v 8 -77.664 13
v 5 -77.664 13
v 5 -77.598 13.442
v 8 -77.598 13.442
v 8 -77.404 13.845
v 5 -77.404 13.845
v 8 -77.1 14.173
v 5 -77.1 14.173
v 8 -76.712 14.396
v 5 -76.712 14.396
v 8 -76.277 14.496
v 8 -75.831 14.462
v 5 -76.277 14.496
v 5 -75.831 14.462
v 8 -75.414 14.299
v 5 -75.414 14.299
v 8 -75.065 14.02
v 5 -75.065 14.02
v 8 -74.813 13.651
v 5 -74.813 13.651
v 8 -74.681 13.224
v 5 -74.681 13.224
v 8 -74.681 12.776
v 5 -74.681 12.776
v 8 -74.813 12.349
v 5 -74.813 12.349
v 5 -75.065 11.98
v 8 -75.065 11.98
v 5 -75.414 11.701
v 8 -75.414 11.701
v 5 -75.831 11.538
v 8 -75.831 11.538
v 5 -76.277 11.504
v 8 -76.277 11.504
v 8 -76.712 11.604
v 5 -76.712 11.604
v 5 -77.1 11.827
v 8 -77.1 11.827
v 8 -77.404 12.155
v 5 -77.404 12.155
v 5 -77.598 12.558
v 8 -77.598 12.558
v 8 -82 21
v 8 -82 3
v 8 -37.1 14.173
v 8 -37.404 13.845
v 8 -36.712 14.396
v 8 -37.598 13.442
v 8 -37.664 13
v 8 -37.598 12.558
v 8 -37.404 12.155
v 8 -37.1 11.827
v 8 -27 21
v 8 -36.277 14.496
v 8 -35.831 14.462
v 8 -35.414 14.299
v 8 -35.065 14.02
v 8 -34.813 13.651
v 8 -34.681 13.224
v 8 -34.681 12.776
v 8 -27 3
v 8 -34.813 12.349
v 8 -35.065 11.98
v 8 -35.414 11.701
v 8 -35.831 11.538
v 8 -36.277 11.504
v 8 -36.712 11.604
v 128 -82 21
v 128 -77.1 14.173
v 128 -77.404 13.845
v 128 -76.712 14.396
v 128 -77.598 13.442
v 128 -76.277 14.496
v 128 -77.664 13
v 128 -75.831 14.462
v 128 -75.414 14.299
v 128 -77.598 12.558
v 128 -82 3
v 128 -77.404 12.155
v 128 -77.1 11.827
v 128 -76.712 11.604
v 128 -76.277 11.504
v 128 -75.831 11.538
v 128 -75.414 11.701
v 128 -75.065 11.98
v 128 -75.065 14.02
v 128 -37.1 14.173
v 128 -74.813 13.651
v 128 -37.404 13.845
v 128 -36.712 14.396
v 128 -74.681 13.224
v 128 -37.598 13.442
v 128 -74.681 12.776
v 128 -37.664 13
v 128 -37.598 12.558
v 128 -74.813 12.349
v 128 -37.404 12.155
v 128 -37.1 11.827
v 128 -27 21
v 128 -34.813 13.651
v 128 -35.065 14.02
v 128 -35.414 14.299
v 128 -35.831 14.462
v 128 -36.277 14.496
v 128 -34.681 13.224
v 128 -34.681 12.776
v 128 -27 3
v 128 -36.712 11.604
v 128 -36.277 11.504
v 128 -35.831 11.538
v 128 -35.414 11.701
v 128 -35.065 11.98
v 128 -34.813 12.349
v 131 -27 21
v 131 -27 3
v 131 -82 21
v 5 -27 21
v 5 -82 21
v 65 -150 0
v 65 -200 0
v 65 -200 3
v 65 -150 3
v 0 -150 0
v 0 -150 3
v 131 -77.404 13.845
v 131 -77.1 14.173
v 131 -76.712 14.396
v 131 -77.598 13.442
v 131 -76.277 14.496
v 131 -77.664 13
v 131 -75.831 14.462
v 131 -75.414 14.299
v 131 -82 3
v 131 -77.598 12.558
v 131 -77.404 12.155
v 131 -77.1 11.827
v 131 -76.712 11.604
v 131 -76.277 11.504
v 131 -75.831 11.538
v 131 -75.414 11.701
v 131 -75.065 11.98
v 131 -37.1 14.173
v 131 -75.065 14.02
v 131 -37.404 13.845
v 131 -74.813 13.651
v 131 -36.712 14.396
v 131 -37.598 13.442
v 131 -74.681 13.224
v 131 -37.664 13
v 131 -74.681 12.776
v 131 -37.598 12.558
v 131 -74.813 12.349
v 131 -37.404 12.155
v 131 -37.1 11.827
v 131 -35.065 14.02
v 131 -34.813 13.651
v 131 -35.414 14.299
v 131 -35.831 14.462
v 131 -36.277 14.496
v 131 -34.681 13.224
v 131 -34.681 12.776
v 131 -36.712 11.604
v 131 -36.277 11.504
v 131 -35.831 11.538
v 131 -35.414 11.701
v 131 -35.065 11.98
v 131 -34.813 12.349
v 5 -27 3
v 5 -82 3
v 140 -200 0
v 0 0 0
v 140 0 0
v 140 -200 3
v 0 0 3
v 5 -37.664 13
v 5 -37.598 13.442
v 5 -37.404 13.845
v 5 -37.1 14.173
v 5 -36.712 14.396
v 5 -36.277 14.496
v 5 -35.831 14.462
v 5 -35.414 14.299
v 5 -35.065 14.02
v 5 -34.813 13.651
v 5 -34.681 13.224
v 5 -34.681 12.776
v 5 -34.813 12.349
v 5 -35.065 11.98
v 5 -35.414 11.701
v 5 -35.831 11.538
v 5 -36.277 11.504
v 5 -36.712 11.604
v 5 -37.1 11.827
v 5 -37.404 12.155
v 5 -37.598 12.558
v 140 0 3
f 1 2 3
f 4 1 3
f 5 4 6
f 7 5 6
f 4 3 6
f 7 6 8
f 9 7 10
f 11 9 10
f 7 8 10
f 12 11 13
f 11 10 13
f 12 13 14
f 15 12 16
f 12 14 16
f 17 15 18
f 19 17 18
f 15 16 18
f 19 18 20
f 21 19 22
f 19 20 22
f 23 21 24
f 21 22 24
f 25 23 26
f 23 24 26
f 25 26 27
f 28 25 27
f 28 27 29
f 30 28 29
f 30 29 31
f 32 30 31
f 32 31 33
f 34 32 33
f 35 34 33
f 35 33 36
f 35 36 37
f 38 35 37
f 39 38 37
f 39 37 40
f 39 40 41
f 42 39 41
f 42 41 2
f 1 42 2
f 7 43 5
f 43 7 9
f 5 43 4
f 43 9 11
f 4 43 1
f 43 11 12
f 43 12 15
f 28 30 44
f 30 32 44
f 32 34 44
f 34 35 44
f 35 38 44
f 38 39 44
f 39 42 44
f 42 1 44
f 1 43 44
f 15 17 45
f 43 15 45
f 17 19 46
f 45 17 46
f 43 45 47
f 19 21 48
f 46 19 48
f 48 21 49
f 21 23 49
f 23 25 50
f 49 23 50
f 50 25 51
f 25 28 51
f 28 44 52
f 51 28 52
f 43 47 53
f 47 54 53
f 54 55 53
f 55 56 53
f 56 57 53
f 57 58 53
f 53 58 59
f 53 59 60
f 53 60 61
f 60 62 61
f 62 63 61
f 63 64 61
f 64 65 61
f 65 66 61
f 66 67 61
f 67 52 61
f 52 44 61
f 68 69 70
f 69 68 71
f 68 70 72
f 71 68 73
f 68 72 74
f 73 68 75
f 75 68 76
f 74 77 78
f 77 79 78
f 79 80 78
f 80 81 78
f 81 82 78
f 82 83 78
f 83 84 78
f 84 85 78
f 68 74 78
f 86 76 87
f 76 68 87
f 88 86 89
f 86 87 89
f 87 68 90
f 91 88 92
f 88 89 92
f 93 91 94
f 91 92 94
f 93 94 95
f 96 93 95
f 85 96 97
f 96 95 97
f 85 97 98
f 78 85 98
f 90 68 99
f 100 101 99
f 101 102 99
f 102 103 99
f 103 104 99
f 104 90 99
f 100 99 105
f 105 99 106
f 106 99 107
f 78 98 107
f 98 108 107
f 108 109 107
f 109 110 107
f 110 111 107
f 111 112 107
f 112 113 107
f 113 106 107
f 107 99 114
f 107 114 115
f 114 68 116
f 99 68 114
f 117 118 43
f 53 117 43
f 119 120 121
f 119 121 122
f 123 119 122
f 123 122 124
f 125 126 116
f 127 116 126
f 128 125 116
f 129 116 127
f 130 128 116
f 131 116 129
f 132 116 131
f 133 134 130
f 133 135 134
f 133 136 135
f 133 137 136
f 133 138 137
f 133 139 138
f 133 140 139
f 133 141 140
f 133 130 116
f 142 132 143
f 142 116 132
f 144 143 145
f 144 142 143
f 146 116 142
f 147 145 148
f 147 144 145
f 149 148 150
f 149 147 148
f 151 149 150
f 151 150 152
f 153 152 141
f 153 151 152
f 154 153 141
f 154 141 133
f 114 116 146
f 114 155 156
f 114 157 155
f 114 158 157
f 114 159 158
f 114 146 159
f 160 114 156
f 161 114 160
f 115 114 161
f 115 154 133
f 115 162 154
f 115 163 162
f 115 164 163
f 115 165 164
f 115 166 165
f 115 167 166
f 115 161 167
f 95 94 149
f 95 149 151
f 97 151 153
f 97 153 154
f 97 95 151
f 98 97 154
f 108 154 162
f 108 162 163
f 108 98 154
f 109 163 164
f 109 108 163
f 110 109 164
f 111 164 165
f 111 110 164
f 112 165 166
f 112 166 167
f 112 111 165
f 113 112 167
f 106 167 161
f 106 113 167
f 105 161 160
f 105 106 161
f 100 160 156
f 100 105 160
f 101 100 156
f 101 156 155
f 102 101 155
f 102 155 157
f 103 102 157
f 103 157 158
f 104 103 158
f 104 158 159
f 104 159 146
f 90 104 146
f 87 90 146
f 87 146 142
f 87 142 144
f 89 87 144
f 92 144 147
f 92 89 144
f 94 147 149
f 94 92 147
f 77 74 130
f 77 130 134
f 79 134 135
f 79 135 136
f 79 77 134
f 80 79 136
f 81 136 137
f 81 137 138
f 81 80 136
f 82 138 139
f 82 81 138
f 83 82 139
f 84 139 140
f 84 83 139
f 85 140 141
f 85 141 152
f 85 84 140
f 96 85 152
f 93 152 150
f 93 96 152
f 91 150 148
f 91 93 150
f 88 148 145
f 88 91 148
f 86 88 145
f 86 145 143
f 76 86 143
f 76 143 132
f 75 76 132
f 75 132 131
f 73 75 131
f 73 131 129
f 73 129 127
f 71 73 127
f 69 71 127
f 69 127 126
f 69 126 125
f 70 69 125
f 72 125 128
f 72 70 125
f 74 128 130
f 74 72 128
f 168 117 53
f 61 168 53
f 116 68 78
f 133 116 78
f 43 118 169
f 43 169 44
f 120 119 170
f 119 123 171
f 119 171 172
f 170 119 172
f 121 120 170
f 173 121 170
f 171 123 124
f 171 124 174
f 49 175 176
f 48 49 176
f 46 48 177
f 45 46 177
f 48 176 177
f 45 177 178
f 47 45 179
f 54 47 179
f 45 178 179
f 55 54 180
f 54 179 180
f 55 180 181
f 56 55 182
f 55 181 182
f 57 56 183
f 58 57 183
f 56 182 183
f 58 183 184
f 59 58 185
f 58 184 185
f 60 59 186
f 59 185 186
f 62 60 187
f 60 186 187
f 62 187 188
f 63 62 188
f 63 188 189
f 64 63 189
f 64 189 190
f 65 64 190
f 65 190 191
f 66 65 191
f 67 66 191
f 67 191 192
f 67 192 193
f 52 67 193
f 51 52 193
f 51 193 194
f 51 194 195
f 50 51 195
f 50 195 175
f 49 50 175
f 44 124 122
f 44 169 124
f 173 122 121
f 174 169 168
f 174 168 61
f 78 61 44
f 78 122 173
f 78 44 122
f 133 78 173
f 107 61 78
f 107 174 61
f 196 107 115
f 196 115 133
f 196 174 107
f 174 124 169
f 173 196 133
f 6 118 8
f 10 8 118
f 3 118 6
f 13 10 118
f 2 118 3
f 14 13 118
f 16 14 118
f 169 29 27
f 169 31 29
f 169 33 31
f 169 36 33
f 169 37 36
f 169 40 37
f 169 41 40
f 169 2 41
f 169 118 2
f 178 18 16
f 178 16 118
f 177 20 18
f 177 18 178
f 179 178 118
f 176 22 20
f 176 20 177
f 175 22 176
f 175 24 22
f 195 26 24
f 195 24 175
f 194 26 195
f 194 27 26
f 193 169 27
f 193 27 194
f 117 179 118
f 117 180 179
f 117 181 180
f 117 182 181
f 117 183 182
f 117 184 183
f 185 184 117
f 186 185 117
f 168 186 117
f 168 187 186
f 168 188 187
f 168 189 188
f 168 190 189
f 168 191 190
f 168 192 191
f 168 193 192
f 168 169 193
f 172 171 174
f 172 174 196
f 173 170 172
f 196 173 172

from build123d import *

# Parameters (mm, degrees)
SKETCH_1_W          = 140
SKETCH_1_H          = 200
EXTRUDE_1_DEPTH     = 3
SKETCH_2_W          = 65
SKETCH_2_H          = 50
CUT_EXTRUDE_1_DEPTH = 10
SKETCH_4_W          = 3
SKETCH_4_H          = 55
EXTRUDE_4_DEPTH     = 18
CUT_EXTRUDE_2_REACH = 244.211
SKETCH_5_R          = 1.5
SKETCH_6_W          = 18
SKETCH_6_H          = 55
SKETCH_6_R          = 1.5
EXTRUDE_6_DEPTH     = 3


with BuildPart() as part:
    # 草图1 → 凸台-拉伸1 (new body)
    with BuildSketch(Plane.XY):
        with Locations((70, -100)):
            Rectangle(SKETCH_1_W, SKETCH_1_H)
    extrude(amount=EXTRUDE_1_DEPTH)

    # 草图2 → 切除-拉伸1 (cut)
    with BuildSketch(Plane(origin=(0, 0, 0), x_dir=(-1, 0, 0), z_dir=(0, 0, -1))):
        with Locations((-32.5, -175)):
            Rectangle(SKETCH_2_W, SKETCH_2_H)
    extrude(amount=-CUT_EXTRUDE_1_DEPTH, mode=Mode.SUBTRACT)

    # 草图4 → 凸台-拉伸4 (add)
    with BuildSketch(Plane.XY.offset(3)):
        with Locations((6.5, -54.5)):
            Rectangle(SKETCH_4_W, SKETCH_4_H)
    extrude(amount=EXTRUDE_4_DEPTH)

    # 草图5 → 切除-拉伸2 (cut, up to next)
    with BuildSketch(Plane.ZY.offset(-5), mode=Mode.PRIVATE) as cut_extrude_2_sk1:
        with Locations(Location((13, -76.16447412, 0), (0, 0, 270))):
            Circle(SKETCH_5_R)
    cut_extrude_2_tool1 = extrude(cut_extrude_2_sk1.sketch, amount=-CUT_EXTRUDE_2_REACH, mode=Mode.PRIVATE) & part.part
    # 草图5 → 切除-拉伸2 (cut, up to next)
    with BuildSketch(Plane.ZY.offset(-5), mode=Mode.PRIVATE) as cut_extrude_2_sk2:
        with Locations(Location((13, -36.16447412, 0), (0, 0, 270))):
            Circle(SKETCH_5_R)
    cut_extrude_2_tool2 = extrude(cut_extrude_2_sk2.sketch, amount=-CUT_EXTRUDE_2_REACH, mode=Mode.PRIVATE) & part.part
    add(cut_extrude_2_tool1.solids().sort_by_distance((5, -76.164474, 13))[0], mode=Mode.SUBTRACT)
    add(cut_extrude_2_tool2.solids().sort_by_distance((5, -36.164474, 13))[0], mode=Mode.SUBTRACT)

    # 草图6 → 凸台-拉伸6 (add)
    with BuildSketch(Plane(origin=(128, 0, 0), x_dir=(0, 0, -1), z_dir=(1, 0, 0))):
        with Locations((-12, -54.5)):
            Rectangle(SKETCH_6_W, SKETCH_6_H)
        with Locations(Location((-13, -76.16447412, 0), (0, 0, 270))):
            Circle(SKETCH_6_R, mode=Mode.SUBTRACT)
        with Locations(Location((-13, -36.16447412, 0), (0, 0, 270))):
            Circle(SKETCH_6_R, mode=Mode.SUBTRACT)
    extrude(amount=EXTRUDE_6_DEPTH)


solid = part.part
